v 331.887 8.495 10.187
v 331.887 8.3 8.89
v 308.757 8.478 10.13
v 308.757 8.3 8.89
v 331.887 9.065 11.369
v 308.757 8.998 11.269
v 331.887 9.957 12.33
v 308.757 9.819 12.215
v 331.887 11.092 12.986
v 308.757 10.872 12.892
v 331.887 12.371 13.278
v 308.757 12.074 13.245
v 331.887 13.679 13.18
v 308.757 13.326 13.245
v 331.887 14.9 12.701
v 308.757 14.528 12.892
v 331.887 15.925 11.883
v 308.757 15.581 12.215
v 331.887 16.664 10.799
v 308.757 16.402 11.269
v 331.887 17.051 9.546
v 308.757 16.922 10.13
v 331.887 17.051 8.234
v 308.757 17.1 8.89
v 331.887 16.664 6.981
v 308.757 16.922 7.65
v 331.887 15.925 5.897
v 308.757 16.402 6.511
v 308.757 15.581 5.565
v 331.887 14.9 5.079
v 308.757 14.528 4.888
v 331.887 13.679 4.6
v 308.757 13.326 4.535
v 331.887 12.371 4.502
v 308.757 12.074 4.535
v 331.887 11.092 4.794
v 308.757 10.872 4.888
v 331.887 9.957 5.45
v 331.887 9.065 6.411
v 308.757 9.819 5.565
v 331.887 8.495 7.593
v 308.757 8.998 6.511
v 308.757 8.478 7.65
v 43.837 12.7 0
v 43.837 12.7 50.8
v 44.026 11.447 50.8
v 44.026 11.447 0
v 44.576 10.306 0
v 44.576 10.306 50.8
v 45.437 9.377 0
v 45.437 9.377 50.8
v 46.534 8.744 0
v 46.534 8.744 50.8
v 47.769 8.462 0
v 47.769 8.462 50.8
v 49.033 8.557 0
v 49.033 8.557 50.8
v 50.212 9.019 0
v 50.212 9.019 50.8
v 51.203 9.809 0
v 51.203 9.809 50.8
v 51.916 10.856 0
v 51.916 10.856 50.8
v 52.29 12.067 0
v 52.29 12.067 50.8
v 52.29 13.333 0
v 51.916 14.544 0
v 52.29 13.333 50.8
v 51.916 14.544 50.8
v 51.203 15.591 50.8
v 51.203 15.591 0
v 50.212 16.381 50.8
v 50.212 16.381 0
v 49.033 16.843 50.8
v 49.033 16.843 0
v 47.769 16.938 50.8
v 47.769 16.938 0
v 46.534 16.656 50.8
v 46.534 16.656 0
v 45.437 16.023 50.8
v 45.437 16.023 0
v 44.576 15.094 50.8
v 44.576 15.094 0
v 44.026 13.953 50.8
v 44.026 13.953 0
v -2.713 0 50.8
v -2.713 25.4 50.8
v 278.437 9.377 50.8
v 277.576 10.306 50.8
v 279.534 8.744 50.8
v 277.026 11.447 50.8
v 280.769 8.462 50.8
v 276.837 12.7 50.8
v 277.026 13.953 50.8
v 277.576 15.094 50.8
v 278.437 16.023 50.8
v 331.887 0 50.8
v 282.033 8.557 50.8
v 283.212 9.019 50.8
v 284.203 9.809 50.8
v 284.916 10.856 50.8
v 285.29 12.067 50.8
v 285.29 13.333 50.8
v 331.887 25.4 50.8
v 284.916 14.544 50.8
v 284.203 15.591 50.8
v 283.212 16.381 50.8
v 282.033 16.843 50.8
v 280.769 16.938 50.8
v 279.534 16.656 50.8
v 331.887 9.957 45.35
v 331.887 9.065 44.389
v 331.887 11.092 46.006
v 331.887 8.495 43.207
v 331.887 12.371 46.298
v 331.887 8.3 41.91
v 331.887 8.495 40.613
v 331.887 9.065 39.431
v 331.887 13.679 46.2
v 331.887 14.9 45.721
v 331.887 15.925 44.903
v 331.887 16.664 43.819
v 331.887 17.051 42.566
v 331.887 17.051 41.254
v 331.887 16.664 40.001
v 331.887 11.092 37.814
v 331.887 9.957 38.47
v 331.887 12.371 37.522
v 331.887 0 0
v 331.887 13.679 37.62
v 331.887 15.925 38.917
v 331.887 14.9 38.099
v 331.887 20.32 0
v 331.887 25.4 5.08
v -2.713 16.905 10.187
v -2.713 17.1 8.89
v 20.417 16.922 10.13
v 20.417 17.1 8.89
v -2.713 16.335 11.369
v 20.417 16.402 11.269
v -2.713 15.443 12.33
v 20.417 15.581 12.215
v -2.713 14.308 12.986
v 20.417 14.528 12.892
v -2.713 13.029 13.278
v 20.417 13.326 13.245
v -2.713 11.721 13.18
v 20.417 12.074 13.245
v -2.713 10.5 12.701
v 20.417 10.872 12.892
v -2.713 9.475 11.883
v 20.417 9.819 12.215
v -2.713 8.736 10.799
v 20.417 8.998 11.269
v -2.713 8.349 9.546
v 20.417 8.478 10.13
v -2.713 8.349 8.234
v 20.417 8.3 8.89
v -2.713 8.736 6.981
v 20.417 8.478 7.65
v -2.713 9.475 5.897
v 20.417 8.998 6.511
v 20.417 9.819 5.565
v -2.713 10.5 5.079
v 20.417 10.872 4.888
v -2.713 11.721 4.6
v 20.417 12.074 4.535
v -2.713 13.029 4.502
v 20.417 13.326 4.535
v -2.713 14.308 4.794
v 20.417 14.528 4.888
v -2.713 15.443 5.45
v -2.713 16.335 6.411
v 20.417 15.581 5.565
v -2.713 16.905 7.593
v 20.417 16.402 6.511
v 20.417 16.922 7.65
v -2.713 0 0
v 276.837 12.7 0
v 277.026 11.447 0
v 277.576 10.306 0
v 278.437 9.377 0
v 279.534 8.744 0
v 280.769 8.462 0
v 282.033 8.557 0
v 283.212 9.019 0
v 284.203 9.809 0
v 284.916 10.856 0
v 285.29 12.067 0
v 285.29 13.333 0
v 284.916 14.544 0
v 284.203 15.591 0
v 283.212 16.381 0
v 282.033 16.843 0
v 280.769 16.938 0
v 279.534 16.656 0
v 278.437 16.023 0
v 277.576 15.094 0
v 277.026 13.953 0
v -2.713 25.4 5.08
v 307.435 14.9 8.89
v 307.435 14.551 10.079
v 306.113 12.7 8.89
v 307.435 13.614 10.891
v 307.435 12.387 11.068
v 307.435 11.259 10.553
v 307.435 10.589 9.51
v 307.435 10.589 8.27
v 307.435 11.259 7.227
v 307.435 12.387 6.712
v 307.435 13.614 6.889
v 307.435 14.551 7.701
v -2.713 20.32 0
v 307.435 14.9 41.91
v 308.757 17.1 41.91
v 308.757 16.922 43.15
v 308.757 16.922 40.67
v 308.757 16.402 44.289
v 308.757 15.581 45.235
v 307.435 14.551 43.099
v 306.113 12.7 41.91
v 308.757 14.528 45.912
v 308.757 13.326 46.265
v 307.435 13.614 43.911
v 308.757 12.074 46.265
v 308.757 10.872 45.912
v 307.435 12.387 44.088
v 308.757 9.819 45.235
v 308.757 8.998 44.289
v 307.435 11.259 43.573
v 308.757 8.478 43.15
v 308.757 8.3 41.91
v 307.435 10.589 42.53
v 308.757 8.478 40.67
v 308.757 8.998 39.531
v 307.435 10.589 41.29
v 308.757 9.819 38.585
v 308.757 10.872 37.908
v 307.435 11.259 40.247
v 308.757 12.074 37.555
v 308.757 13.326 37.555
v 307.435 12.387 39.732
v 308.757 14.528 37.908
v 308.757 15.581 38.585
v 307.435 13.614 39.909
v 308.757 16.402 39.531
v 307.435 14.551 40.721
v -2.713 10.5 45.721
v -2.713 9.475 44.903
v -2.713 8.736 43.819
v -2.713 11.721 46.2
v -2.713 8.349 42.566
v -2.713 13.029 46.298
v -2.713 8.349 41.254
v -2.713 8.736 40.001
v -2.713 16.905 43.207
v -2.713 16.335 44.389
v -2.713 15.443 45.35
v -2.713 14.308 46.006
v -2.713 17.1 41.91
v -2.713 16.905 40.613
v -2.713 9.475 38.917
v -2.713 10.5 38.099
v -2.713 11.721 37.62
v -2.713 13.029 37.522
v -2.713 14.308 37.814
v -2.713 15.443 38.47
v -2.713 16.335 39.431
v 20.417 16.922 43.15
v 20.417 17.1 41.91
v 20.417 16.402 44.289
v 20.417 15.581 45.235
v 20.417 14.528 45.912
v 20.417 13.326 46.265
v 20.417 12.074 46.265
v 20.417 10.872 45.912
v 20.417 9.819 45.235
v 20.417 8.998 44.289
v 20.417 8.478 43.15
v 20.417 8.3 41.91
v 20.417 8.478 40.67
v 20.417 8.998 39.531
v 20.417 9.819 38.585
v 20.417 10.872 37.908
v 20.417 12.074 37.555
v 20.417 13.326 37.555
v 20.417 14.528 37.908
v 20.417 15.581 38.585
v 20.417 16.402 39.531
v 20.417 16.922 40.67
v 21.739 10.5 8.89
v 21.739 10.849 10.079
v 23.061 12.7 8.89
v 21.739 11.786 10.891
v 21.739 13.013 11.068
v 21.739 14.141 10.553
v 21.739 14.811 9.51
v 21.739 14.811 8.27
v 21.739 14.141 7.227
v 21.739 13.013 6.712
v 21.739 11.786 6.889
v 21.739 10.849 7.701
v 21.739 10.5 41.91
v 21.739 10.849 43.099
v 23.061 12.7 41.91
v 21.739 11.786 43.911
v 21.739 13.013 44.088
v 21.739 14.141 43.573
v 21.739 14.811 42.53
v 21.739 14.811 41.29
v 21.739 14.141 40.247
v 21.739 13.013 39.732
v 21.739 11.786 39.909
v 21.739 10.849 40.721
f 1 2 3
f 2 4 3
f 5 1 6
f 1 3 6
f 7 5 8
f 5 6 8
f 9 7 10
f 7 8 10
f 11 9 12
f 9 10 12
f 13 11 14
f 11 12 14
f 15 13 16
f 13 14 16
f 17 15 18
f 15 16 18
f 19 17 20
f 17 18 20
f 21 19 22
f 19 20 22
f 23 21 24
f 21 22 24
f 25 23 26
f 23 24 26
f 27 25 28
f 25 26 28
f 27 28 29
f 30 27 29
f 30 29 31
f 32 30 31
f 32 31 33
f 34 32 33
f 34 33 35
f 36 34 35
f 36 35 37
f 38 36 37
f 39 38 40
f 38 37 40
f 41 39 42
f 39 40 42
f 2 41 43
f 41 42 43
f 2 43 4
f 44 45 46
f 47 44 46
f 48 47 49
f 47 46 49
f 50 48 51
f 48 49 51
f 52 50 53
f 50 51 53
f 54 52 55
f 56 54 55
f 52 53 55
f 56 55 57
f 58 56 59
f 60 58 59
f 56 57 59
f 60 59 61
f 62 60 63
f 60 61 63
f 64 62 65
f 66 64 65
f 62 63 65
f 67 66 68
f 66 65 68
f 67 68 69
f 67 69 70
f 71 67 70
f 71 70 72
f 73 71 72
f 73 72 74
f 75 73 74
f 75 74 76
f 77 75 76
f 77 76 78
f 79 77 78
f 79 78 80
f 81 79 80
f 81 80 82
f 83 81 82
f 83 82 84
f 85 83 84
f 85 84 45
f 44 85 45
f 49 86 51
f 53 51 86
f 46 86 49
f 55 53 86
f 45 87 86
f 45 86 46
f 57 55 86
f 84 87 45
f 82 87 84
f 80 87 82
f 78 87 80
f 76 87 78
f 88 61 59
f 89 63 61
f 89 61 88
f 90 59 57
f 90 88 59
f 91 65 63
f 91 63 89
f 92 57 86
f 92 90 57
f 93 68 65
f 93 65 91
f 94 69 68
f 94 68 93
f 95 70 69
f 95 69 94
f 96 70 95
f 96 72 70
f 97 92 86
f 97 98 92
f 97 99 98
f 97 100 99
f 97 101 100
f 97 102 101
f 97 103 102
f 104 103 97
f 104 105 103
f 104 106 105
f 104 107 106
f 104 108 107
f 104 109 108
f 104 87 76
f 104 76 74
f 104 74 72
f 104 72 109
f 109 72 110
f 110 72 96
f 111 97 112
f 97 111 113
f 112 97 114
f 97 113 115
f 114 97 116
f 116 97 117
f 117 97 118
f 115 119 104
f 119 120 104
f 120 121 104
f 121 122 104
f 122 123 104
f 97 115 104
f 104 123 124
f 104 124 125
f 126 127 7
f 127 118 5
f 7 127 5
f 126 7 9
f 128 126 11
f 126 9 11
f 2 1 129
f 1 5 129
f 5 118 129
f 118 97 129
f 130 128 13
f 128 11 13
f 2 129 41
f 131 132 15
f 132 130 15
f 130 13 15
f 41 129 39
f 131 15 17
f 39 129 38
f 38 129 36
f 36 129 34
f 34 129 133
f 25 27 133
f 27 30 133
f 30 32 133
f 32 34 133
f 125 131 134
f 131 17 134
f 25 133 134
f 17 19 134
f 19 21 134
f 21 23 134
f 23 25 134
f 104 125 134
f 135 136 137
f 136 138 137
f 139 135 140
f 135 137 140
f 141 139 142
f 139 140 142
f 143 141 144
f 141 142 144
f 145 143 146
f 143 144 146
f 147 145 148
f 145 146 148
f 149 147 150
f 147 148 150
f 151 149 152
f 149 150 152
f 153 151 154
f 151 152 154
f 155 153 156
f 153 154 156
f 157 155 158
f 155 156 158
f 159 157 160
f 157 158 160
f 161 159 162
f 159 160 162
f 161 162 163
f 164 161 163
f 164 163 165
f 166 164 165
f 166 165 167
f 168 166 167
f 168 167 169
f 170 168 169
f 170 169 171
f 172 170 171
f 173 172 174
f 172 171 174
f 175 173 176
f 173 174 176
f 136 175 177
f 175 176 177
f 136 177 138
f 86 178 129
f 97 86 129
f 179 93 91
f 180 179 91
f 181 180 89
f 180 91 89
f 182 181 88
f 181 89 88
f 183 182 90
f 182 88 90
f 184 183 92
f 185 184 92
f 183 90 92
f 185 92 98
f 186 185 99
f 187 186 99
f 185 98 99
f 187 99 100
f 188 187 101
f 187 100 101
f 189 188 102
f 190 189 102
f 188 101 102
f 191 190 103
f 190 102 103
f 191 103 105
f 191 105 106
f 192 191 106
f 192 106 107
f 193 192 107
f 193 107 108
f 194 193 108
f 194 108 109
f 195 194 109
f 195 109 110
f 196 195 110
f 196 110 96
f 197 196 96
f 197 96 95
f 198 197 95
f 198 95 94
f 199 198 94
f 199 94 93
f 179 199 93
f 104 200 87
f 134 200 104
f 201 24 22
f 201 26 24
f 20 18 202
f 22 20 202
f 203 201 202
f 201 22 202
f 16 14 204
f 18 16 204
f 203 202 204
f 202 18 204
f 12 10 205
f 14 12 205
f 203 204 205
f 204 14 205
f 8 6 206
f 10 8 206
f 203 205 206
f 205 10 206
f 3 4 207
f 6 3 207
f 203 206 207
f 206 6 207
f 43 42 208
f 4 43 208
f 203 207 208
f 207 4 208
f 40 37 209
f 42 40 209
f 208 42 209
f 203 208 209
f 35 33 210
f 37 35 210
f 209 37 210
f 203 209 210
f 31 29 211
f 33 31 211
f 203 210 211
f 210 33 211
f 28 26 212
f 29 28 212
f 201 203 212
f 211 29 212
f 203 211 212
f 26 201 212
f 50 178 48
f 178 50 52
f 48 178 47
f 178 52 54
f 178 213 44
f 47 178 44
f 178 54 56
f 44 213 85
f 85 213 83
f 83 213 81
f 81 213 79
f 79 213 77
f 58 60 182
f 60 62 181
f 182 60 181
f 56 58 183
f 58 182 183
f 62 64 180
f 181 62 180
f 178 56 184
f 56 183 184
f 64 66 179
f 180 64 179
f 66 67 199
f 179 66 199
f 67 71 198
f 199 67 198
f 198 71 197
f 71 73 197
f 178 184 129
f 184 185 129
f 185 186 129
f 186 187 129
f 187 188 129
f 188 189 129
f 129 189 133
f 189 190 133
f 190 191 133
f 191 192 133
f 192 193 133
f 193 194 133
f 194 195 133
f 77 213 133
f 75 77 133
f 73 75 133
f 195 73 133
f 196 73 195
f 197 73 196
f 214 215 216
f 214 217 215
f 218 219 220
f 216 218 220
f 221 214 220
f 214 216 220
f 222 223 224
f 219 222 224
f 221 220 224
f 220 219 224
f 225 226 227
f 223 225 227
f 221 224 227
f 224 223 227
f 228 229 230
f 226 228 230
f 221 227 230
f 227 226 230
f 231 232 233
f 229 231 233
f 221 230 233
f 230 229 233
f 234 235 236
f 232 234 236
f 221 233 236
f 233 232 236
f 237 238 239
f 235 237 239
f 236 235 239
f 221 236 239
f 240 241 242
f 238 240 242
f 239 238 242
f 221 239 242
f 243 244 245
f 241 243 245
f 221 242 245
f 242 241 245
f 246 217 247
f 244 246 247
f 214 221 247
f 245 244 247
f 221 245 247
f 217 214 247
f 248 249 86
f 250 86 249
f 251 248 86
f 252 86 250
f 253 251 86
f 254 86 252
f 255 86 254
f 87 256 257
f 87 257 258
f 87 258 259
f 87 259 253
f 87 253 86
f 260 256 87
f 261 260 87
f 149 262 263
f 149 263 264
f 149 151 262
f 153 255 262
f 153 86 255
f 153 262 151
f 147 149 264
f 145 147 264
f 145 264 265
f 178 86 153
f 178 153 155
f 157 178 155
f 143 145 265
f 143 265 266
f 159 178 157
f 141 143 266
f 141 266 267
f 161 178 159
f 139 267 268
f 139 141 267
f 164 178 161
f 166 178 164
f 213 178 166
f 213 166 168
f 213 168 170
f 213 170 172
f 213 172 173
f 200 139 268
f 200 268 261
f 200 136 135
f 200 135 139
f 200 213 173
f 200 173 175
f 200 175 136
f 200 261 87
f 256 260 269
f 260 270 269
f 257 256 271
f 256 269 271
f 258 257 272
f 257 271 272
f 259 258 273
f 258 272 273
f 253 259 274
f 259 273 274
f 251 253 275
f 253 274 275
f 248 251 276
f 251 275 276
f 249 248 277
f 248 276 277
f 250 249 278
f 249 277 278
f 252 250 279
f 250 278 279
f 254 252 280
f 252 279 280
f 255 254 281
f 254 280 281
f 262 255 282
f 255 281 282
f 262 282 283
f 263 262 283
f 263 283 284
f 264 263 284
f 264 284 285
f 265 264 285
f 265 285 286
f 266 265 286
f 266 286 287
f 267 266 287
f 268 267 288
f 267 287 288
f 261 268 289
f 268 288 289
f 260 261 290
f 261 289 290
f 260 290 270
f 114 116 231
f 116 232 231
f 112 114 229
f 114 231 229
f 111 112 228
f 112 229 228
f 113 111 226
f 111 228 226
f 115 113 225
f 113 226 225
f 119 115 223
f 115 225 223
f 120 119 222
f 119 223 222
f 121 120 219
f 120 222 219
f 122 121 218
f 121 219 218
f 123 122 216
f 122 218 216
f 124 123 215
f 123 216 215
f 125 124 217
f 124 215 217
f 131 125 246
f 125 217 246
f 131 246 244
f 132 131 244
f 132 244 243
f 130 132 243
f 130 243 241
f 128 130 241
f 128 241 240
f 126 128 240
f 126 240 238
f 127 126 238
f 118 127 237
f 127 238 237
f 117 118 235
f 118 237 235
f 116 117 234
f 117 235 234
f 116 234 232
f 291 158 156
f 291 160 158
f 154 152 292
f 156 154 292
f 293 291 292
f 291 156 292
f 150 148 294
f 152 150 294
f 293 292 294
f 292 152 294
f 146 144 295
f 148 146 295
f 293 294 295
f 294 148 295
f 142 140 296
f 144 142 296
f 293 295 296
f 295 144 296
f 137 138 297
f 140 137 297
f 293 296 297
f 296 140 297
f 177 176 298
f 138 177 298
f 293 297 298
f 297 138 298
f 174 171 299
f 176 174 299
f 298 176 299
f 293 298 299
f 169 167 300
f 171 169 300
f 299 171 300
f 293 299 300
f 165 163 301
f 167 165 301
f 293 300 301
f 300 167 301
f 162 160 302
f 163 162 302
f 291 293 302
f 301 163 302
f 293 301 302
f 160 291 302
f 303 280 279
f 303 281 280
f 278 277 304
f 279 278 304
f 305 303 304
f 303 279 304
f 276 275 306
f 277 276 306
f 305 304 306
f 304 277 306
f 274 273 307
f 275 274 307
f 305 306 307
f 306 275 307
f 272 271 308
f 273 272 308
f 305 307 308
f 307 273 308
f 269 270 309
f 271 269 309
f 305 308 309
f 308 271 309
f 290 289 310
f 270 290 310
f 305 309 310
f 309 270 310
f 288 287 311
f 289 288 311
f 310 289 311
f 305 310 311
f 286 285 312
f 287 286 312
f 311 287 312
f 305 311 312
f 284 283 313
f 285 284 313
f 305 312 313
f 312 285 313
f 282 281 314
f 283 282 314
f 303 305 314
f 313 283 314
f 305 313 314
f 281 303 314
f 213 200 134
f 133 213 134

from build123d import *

# Parameters (mm, degrees)
F0_W           = 334.6
F0_H           = 25.4
F1_DEPTH       = 50.8
F4_D           = 8.8
F4_DEPTH       = 23.1302
F4_TIP         = 2.6437867237
F4_ON_F2_D     = 8.8
F4_ON_F2_DEPTH = 23.1302
F4_ON_F2_TIP   = 2.6437867237
F5_SIZE        = 5.08
F7_D           = 8.5


# Not quite as in the source:
# - a feature names something its author has since deleted; it is built from what else it names


with BuildPart() as f1:
    # F0 (on Top) → F1 (new body)
    with BuildSketch(Plane.XY):
        with Locations((164.5870582715, 12.7)):
            Rectangle(F0_W, F0_H)
    extrude(amount=F1_DEPTH)

    # F4
    with Locations(Plane(origin=(-2.7129417285, 0, 0), x_dir=(0, -1, 0), z_dir=(-1, 0, 0))):
        with Locations((-12.7, 41.91), (-12.7, 8.89)):
            Hole(F4_D / 2, depth=F4_DEPTH)
            with Locations((0, 0, -(F4_DEPTH + F4_TIP / 2))):  # 118° drill point
                Cone(0, F4_D / 2, F4_TIP, mode=Mode.SUBTRACT)

    # F4 on F2
    with Locations(Plane.YZ.offset(331.8870582715)):
        with Locations((12.7, 41.91), (12.7, 8.89)):
            Hole(F4_ON_F2_D / 2, depth=F4_ON_F2_DEPTH)
            with Locations((0, 0, -(F4_ON_F2_DEPTH + F4_ON_F2_TIP / 2))):  # 118° drill point
                Cone(0, F4_ON_F2_D / 2, F4_ON_F2_TIP, mode=Mode.SUBTRACT)

    # F5
    f5_edges = [f1.edges().sort_by_distance(p)[0] for p in [
        (164.587058, 25.4, 0),
    ]]
    chamfer(f5_edges, length=F5_SIZE)

    # F7 (through all)
    with Locations(Plane(origin=(0, 0, 0), x_dir=(1, 0, 0), z_dir=(0, 0, -1))):
        with Locations((48.0870582715, -12.7), (281.0870582715, -12.7)):
            Hole(F7_D / 2)


solid = f1.part
